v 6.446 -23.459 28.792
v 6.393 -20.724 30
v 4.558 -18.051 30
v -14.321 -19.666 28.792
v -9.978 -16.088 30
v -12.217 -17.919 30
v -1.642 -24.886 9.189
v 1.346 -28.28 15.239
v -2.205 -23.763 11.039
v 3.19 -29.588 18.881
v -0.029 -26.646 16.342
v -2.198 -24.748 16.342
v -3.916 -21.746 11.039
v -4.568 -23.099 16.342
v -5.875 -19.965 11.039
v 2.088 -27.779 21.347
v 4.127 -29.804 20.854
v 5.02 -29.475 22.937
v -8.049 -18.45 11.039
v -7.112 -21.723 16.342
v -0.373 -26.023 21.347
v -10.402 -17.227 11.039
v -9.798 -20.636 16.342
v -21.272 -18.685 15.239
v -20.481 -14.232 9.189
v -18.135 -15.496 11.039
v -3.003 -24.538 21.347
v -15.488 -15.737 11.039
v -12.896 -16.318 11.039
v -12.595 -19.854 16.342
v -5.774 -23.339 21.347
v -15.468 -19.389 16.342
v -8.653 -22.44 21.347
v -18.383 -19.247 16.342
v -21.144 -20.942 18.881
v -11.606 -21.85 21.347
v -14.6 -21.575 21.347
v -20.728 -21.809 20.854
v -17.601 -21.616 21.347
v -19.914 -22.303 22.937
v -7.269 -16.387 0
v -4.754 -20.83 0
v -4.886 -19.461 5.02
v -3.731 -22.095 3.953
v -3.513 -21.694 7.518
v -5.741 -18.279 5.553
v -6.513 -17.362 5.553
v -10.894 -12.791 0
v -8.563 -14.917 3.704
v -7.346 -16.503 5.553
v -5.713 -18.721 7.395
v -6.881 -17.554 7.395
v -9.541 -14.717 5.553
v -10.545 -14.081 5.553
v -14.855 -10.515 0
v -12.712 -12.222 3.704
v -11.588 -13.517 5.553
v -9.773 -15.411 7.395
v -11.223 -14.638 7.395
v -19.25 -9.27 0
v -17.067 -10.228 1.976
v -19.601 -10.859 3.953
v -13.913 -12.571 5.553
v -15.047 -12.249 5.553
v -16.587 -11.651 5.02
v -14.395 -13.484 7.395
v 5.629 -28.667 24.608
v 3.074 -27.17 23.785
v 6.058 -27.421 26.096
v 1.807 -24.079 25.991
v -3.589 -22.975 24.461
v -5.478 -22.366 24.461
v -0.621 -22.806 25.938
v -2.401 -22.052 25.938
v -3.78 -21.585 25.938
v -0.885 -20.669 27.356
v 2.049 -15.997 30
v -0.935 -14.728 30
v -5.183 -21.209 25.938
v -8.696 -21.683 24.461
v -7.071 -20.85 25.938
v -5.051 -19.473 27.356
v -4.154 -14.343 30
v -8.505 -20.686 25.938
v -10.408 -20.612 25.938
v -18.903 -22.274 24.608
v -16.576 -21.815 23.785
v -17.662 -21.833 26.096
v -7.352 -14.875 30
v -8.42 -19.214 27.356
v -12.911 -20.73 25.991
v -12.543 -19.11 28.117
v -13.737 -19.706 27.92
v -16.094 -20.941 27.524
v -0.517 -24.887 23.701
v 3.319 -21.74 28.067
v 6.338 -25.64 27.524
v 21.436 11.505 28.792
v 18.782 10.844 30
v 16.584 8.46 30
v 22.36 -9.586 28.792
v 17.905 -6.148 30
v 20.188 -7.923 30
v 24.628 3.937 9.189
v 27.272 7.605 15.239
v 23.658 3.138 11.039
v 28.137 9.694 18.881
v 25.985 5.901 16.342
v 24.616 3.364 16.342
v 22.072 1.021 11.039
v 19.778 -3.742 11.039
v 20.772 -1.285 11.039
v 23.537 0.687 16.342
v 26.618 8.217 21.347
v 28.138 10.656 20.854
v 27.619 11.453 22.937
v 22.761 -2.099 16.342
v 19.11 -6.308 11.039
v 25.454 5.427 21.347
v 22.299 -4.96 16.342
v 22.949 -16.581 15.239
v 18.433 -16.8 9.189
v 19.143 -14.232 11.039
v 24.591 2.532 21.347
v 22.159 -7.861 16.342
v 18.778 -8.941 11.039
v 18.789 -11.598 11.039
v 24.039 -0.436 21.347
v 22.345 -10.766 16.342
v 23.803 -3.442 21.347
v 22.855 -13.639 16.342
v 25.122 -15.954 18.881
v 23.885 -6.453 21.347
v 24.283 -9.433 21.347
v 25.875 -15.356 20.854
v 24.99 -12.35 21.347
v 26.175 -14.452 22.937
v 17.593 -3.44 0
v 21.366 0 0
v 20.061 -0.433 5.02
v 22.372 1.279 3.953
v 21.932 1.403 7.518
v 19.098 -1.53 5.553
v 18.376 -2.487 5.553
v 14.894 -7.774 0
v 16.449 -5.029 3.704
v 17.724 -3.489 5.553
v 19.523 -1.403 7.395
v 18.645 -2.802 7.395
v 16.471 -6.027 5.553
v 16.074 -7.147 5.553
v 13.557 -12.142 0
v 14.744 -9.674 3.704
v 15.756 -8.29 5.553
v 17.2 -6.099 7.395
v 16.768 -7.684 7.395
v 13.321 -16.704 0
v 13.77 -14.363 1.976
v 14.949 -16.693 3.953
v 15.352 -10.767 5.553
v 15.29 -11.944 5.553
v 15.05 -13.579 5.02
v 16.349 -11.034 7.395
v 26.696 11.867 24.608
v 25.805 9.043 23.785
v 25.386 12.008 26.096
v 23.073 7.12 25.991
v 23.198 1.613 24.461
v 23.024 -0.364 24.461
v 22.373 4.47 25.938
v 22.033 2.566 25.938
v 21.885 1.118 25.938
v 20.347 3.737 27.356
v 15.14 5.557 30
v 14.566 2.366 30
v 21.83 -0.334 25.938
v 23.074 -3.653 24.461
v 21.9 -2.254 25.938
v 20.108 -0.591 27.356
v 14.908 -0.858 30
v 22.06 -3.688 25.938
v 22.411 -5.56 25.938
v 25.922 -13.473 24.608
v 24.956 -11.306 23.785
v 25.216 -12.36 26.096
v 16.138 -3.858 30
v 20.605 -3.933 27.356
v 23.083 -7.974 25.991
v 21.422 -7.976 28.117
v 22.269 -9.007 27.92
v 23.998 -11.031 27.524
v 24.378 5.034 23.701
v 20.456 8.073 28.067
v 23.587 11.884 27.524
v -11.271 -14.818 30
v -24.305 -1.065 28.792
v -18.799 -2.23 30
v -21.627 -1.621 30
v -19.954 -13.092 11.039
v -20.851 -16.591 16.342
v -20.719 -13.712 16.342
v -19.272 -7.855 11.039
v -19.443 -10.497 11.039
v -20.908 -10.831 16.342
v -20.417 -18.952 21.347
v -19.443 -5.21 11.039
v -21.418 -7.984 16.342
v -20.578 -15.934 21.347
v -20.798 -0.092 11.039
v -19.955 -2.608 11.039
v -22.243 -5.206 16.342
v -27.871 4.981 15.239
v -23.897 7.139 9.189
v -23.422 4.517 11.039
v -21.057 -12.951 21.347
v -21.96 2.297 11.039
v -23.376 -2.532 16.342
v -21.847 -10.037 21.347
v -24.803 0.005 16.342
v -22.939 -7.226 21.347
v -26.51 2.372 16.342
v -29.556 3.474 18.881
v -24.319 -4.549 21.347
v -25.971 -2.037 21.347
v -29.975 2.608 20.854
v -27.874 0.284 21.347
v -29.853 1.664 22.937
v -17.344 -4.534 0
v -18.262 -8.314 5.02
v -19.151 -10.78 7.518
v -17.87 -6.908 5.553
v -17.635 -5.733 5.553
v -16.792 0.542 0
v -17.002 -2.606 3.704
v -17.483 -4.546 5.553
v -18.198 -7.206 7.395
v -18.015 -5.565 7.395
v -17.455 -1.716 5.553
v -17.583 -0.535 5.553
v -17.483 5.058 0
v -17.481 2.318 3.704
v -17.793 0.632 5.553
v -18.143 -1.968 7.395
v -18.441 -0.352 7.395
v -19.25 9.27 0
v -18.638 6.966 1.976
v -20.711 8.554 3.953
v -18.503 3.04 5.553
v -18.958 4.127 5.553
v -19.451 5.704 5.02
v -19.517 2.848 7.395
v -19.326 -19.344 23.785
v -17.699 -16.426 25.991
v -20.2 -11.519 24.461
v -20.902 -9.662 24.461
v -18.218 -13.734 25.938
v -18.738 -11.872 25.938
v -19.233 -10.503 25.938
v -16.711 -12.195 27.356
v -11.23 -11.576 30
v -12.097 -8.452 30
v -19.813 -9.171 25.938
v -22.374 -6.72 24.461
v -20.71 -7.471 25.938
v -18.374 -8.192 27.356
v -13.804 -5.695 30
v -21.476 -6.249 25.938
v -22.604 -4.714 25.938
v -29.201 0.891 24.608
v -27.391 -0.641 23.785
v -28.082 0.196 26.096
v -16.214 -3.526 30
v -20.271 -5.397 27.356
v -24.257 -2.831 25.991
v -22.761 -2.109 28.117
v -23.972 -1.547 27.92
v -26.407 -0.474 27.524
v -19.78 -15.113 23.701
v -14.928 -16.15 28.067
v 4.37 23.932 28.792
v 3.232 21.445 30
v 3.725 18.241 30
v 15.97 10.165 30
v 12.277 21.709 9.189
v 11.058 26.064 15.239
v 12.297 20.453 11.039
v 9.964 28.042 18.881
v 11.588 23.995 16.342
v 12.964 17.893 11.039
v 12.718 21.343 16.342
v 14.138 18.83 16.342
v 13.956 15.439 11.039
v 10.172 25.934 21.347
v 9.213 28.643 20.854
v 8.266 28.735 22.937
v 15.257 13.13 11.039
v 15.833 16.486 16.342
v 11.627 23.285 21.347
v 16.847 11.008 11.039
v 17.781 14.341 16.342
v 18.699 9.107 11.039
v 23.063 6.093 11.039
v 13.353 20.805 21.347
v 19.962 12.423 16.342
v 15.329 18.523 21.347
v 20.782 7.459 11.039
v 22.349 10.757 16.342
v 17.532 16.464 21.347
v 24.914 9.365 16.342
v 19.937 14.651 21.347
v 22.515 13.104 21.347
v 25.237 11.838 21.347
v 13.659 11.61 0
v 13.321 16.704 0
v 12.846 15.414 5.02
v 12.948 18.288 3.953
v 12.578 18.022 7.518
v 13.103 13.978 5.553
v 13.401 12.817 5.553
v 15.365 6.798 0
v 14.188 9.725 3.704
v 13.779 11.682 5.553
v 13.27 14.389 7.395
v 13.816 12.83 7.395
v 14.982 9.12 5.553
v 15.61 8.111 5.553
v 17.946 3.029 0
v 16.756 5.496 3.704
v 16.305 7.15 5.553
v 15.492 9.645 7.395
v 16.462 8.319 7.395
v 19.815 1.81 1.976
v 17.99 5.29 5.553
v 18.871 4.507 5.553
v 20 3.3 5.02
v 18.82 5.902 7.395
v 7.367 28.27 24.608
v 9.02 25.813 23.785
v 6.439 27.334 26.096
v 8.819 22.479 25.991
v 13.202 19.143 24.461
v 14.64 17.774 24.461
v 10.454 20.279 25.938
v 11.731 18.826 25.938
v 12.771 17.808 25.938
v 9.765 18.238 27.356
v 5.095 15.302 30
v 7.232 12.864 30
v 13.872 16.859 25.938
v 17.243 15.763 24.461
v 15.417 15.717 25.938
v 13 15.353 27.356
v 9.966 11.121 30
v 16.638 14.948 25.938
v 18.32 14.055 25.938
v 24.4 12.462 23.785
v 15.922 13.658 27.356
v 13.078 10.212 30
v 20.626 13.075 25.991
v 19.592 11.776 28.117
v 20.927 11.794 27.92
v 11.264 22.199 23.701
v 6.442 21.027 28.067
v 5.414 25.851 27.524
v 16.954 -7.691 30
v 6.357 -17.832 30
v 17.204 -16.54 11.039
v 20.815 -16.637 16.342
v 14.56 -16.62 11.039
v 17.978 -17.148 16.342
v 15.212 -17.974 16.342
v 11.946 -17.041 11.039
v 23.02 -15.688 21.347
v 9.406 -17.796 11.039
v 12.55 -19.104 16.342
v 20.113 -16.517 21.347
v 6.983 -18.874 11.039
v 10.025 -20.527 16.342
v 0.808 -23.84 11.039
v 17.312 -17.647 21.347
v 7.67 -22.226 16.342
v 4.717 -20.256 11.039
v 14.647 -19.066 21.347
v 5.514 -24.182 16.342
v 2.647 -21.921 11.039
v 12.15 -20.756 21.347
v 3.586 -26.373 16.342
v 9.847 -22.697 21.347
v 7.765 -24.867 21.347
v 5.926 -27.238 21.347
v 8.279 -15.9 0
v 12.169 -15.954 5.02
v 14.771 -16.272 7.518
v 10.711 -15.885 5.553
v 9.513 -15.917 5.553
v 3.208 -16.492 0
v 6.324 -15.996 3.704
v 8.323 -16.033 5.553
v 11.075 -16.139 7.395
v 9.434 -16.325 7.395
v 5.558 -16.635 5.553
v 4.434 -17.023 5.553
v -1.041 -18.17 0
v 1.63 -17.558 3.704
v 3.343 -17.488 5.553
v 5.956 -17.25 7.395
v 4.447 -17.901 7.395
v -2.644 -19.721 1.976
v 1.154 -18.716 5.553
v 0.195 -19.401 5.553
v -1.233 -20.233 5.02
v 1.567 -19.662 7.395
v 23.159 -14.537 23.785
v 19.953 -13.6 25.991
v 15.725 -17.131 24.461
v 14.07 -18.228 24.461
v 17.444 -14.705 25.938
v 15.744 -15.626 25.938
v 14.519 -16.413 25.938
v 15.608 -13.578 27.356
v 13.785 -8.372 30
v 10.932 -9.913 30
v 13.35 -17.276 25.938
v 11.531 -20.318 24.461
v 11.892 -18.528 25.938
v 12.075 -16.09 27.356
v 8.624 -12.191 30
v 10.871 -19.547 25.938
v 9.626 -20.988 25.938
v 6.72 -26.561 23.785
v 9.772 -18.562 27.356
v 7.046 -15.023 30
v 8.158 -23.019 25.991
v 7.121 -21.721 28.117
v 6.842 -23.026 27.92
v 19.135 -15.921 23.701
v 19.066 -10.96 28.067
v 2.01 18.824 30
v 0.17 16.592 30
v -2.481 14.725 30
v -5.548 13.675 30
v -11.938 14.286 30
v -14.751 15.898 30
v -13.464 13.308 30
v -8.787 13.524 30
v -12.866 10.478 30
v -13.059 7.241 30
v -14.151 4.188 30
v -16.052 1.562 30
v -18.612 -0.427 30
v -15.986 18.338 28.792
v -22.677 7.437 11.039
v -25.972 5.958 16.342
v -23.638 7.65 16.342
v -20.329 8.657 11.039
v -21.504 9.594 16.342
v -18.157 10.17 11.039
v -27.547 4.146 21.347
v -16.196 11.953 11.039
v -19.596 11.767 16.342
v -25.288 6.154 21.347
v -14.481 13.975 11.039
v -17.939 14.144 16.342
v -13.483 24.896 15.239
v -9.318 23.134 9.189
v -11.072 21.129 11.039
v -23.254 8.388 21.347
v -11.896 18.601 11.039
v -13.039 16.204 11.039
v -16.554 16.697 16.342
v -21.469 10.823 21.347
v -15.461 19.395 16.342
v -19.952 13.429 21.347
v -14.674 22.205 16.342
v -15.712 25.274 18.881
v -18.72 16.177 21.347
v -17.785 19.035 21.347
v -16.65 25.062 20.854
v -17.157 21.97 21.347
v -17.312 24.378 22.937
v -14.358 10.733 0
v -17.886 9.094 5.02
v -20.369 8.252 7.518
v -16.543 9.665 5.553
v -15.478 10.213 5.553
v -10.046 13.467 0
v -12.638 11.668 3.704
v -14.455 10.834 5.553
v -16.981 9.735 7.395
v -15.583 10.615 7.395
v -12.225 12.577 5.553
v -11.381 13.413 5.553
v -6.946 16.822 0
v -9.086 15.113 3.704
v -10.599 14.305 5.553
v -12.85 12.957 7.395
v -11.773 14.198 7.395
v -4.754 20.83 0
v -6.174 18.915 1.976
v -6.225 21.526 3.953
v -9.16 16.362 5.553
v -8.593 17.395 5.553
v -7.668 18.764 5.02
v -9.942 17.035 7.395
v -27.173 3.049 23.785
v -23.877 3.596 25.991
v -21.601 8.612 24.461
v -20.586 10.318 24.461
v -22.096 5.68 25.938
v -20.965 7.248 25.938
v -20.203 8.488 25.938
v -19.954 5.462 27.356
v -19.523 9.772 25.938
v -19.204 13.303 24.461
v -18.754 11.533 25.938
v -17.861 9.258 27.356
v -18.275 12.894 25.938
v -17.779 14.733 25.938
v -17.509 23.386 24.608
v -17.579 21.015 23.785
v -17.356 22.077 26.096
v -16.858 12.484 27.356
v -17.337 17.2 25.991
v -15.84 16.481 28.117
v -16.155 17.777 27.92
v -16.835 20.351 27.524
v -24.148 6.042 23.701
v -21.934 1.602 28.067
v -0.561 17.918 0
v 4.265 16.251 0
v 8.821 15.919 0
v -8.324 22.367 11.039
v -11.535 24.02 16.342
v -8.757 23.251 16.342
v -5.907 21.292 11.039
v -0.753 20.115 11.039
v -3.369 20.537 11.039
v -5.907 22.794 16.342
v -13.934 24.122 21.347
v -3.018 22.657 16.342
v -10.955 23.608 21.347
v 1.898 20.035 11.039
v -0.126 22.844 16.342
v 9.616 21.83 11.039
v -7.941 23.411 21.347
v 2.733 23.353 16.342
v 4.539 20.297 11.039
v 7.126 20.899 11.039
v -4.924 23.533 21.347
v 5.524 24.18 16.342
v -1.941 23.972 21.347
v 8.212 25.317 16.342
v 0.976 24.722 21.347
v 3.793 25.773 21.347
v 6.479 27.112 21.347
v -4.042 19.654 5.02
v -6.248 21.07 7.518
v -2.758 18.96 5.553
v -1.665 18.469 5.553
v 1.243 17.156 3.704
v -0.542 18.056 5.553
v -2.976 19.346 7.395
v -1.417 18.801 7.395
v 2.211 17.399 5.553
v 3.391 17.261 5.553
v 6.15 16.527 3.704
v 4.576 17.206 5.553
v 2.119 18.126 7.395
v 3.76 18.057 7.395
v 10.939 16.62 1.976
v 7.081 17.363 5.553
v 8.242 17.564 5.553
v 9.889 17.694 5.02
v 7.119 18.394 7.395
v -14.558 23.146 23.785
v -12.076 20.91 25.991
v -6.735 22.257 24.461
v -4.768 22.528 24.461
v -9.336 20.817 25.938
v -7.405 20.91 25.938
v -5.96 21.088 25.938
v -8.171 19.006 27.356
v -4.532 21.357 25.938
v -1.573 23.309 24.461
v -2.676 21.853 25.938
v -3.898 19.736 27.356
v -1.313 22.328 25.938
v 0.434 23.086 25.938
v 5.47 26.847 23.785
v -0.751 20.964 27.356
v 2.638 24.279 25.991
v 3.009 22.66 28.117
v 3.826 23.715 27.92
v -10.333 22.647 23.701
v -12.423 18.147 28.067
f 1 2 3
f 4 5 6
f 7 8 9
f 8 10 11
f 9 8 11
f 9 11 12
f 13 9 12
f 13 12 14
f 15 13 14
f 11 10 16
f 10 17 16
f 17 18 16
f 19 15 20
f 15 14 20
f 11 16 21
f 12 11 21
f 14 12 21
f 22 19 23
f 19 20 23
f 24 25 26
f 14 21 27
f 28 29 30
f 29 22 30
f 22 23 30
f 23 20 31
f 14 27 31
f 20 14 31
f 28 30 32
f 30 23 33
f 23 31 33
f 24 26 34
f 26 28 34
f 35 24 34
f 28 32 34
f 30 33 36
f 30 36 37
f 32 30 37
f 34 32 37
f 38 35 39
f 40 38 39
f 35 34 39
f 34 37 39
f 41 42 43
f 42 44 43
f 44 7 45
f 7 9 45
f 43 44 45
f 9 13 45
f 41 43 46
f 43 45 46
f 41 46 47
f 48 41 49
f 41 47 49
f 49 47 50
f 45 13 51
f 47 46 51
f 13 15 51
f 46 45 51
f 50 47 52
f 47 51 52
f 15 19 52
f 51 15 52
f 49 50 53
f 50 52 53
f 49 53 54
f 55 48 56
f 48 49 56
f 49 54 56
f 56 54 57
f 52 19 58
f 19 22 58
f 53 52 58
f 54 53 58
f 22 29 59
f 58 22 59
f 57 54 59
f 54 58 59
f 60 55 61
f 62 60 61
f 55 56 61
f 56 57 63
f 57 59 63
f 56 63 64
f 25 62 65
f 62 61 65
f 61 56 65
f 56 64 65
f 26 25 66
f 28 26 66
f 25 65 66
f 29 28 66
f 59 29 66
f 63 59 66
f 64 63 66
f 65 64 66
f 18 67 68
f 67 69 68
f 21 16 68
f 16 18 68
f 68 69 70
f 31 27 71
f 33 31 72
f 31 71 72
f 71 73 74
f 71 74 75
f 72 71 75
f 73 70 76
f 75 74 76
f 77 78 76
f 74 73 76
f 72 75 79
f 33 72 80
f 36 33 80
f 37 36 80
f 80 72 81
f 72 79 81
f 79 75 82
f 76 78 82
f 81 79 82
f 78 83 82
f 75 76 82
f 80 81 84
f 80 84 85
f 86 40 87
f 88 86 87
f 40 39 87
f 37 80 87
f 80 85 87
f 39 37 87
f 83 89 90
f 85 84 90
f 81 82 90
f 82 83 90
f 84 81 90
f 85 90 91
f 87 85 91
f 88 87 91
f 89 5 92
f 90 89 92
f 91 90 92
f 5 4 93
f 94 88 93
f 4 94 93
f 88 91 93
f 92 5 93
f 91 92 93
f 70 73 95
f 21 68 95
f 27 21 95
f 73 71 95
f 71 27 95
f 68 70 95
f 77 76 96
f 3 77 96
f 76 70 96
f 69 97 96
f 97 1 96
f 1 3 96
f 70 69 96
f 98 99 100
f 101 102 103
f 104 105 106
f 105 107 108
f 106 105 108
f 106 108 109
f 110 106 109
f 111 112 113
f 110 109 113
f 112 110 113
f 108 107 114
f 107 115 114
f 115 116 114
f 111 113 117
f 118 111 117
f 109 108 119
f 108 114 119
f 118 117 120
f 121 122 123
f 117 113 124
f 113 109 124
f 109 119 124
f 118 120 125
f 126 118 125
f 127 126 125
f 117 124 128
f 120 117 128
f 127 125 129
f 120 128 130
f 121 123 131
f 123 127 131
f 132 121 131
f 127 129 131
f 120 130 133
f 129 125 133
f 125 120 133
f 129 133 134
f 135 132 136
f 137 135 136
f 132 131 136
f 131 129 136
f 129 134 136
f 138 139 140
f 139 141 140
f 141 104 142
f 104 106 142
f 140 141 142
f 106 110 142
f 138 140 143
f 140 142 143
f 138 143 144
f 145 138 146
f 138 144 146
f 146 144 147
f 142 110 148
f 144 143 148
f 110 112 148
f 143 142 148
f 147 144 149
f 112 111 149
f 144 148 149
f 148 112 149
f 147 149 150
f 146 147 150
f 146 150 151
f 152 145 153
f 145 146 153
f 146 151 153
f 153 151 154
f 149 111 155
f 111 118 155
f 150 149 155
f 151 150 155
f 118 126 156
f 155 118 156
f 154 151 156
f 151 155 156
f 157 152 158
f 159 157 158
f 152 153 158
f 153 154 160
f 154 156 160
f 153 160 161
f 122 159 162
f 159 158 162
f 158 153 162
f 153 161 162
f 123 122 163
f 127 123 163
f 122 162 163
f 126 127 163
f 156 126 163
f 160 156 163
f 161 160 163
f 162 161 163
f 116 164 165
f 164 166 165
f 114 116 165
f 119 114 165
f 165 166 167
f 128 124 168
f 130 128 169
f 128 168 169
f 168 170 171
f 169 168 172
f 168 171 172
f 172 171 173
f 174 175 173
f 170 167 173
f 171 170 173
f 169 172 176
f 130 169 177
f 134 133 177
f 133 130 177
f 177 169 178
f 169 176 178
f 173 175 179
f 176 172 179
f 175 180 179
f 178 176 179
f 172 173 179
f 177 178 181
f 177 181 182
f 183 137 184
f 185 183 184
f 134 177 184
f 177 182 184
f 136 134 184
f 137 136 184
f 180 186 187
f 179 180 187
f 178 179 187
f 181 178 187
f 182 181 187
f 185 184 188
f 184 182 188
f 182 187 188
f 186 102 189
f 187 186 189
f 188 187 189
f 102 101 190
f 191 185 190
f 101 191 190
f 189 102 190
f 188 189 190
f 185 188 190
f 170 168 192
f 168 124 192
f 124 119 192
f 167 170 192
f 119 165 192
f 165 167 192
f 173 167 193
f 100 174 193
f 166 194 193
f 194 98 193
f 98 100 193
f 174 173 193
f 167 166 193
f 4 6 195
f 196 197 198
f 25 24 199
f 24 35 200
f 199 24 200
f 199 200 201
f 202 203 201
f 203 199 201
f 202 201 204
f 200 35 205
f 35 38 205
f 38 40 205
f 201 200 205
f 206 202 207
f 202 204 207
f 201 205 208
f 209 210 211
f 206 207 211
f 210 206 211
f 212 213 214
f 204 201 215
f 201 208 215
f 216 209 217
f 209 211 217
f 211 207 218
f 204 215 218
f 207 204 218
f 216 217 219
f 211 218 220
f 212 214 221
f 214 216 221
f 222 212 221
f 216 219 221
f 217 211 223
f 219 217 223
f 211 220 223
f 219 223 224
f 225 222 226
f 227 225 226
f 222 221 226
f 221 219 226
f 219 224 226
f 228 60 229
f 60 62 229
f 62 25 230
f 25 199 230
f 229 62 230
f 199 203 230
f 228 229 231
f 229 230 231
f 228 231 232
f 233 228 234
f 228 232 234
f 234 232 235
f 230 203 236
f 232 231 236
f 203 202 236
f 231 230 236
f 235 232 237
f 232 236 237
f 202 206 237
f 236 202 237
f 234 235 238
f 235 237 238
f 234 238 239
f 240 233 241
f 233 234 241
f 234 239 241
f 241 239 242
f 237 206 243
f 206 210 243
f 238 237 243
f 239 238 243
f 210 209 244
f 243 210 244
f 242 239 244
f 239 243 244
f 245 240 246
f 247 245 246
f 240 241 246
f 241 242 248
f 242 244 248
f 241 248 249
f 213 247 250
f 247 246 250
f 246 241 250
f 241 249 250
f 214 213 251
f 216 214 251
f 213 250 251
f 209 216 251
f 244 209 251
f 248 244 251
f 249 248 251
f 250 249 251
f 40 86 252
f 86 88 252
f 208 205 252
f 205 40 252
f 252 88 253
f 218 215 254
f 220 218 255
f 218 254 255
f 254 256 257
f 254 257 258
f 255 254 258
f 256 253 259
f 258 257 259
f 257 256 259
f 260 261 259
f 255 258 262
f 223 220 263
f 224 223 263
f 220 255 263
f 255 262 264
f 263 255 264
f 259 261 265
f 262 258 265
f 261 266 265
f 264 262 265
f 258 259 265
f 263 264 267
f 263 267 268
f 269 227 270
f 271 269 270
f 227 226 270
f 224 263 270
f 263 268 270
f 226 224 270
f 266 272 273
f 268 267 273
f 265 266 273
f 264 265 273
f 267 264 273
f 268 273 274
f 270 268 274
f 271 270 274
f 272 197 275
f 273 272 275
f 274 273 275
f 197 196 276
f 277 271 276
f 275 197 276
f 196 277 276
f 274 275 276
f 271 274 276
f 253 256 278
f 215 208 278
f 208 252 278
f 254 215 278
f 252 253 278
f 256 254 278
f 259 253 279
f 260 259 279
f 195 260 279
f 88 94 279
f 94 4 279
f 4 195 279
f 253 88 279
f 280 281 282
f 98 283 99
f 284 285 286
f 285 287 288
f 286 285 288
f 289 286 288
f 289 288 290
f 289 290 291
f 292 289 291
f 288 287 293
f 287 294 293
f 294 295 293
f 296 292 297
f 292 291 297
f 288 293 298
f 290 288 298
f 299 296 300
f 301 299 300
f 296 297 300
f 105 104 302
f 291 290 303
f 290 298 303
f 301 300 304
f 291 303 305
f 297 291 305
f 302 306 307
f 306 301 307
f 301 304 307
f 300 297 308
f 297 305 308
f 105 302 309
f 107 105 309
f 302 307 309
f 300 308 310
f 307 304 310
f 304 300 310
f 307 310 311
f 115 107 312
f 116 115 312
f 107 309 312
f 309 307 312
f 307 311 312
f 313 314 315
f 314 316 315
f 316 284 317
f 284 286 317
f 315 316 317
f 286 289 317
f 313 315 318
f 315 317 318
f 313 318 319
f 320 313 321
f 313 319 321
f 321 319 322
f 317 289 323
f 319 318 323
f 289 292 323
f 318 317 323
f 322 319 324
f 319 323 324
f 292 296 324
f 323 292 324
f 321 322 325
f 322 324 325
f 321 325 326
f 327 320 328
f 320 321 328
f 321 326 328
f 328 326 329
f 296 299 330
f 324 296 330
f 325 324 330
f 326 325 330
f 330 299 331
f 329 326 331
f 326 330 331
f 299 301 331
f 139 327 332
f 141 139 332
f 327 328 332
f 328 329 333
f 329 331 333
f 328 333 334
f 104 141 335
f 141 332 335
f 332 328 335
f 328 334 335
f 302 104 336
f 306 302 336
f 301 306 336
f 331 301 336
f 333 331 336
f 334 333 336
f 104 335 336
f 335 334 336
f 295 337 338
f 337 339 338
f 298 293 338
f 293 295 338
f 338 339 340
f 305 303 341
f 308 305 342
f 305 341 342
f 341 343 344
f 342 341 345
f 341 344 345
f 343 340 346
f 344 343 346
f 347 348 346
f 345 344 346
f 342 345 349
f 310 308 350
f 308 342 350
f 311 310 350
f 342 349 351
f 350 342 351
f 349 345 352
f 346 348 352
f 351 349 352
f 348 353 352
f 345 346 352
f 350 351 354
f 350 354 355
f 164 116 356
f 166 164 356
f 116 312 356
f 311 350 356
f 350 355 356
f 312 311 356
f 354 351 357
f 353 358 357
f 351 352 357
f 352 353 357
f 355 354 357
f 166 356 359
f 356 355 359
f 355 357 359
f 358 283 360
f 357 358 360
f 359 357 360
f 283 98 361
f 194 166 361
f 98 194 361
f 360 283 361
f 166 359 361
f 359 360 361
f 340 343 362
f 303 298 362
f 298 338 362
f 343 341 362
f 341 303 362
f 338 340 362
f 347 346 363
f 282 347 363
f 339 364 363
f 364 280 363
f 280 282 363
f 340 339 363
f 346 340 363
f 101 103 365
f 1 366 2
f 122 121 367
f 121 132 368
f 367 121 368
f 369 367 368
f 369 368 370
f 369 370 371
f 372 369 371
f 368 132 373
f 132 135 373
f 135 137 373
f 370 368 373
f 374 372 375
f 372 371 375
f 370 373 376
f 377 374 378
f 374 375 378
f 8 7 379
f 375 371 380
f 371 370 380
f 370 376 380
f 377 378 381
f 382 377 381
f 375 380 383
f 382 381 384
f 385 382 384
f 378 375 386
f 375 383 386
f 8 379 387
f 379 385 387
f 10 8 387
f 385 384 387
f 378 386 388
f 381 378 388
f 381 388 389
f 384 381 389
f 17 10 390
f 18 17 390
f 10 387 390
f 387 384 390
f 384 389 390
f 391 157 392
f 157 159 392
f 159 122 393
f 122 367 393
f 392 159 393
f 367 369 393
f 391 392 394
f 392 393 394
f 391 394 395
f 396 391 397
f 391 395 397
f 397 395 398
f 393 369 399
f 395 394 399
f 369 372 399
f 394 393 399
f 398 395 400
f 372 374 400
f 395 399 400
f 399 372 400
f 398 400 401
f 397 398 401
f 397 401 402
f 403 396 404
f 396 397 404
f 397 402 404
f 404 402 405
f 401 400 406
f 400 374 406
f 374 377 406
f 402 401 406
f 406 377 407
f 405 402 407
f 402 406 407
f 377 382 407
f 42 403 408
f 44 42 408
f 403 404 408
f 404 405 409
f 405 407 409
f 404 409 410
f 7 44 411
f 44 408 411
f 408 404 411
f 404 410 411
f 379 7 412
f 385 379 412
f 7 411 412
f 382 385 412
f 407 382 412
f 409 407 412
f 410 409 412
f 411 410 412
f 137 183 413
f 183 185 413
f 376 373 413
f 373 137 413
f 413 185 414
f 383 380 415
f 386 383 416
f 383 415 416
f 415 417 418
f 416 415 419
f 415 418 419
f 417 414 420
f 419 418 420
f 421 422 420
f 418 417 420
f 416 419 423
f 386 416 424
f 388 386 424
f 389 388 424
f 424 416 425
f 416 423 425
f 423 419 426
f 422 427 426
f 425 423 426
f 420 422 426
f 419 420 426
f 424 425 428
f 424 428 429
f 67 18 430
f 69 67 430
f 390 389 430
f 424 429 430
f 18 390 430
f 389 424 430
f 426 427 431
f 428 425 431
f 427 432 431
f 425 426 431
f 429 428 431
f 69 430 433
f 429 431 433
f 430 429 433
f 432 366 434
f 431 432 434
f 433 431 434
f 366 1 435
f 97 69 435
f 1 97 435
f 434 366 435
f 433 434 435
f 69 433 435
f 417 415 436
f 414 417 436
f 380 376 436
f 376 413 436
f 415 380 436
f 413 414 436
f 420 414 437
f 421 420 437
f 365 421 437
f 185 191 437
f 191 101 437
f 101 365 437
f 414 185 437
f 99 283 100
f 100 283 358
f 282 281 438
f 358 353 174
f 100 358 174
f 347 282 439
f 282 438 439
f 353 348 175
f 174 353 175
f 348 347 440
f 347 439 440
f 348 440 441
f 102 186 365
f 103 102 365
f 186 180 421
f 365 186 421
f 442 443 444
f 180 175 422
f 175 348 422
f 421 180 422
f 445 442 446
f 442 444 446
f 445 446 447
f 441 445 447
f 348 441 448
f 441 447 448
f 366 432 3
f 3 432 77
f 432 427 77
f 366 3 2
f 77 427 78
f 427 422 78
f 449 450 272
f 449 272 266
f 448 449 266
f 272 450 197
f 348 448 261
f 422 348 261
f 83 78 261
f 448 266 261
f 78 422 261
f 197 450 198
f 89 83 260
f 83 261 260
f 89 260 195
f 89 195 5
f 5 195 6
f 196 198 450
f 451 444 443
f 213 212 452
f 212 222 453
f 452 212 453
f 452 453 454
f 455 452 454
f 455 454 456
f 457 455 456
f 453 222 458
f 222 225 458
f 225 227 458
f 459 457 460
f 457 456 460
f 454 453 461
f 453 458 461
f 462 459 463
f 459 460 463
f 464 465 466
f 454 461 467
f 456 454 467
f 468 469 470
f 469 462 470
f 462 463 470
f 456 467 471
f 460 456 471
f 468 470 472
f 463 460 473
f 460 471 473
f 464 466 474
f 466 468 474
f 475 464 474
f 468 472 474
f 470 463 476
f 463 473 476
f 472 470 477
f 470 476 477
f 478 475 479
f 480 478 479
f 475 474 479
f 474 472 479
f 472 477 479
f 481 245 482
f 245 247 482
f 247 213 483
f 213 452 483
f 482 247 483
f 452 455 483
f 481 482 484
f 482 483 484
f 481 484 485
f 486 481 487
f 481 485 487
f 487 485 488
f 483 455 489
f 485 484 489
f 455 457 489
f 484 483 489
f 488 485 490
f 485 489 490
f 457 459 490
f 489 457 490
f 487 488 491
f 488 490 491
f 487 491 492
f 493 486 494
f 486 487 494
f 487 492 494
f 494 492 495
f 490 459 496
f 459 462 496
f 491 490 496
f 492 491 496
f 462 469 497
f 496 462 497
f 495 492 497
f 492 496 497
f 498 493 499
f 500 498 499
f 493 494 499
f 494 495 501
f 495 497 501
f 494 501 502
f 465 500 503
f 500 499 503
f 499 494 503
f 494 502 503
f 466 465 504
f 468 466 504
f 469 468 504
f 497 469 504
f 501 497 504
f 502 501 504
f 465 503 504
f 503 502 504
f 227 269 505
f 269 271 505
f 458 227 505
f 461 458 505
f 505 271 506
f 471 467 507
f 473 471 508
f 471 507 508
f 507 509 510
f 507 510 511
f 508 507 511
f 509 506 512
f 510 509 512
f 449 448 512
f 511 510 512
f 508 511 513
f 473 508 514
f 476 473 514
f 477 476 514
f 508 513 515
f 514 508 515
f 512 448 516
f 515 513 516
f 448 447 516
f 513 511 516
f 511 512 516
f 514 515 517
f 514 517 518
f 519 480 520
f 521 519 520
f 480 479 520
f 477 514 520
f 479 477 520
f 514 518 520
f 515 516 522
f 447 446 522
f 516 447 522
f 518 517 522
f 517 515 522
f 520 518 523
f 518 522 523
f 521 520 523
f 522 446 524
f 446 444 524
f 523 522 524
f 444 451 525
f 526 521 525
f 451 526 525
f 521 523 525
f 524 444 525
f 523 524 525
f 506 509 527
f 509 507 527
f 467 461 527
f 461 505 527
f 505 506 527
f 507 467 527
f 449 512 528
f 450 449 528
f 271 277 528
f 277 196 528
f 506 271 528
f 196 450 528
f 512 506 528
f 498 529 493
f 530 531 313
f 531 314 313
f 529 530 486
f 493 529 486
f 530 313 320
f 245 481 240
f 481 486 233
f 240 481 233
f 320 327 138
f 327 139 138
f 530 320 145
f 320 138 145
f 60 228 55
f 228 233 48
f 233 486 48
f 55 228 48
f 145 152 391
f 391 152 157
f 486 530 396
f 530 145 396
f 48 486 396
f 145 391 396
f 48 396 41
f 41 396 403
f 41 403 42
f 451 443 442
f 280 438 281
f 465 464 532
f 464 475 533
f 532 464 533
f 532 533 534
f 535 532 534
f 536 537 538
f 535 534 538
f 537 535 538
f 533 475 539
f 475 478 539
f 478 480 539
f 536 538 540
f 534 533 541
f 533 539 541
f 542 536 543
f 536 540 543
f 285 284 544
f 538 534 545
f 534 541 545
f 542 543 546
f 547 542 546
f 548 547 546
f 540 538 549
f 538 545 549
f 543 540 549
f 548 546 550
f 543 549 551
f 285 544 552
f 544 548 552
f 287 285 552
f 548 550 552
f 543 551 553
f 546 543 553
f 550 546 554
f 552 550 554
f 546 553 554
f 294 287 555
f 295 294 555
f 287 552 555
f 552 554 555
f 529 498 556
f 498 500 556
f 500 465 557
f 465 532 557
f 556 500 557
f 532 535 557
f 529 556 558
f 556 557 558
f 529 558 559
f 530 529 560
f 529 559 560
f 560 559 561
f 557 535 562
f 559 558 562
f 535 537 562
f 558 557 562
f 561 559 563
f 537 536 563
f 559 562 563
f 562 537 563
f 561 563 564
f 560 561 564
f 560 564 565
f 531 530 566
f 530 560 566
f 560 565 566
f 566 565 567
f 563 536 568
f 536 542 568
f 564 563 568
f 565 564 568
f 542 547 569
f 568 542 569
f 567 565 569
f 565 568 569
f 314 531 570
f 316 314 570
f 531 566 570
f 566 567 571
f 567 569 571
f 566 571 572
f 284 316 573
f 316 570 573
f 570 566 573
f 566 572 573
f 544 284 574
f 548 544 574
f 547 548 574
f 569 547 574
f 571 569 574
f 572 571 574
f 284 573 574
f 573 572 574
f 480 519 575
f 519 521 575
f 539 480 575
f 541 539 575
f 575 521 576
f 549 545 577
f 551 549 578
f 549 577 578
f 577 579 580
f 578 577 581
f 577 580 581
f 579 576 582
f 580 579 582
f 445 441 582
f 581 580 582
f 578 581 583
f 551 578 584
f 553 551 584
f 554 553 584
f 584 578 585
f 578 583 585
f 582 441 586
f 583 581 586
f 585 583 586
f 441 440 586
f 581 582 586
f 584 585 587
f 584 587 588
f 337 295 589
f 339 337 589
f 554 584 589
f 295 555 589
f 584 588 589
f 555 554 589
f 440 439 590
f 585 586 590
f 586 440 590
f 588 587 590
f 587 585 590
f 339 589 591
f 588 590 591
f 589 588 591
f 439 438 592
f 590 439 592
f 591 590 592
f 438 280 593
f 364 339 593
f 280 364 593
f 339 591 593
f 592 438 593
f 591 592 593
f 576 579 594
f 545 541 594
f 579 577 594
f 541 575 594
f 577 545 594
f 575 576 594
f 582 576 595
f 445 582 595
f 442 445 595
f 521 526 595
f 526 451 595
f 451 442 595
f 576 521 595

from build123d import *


with BuildPart() as part:
    # Sketch (on XY_Plane of Origin) → AdditiveLoft section 0
    with BuildSketch(Plane.XY):
        with BuildLine():
            ThreePointArc((13.321386, 16.70449), (15.122391, 7.28256), (21.365845, 0))
            ThreePointArc((21.365845, 0), (15.122391, -7.28256), (13.321386, -16.70449))
            ThreePointArc((13.321386, -16.70449), (3.734922, -16.363763), (-4.754348, -20.830158))
            ThreePointArc((-4.754348, -20.830158), (-10.465019, -13.122719), (-19.249961, -9.270293))
            ThreePointArc((-19.249961, -9.270293), (-16.784588, 0), (-19.249961, 9.270293))
            ThreePointArc((-19.249961, 9.270293), (-10.465019, 13.122719), (-4.754348, 20.830158))
            ThreePointArc((-4.754348, 20.830158), (3.734922, 16.363763), (13.321386, 16.70449))
        make_face()
    # Sketch001 (on Sketch) → AdditiveLoft section 1
    with BuildSketch(Plane.XY.offset(10)):
        with BuildLine():
            ThreePointArc((12.146837, 22.305334), (15.826911, 11.378774), (25.012441, 4.410368))
            ThreePointArc((25.012441, 4.410368), (18.764202, -5.279428), (19.043167, -16.805695))
            ThreePointArc((19.043167, -16.805695), (7.571666, -17.962113), (-1.266001, -25.366727))
            ThreePointArc((-1.266001, -25.366727), (-9.322489, -17.118961), (-20.621844, -14.826096))
            ThreePointArc((-20.621844, -14.826096), (-19.19662, -3.384882), (-24.449018, 6.878887))
            ThreePointArc((-24.449018, 6.878887), (-14.615304, 12.898082), (-9.865583, 23.403928))
            ThreePointArc((-9.865583, 23.403928), (0.971634, 19.468527), (12.146837, 22.305334))
        make_face()
    # Sketch002 → AdditiveLoft section 2
    with BuildSketch(Plane.XY.offset(20)):
        with BuildLine():
            ThreePointArc((9.553759, 28.435319), (16.677604, 17.098702), (28.188299, 10.259702))
            ThreePointArc((28.188299, 10.259702), (23.766619, -2.378209), (25.596475, -15.64168))
            ThreePointArc((25.596475, -15.64168), (12.958886, -20.06428), (3.729983, -29.764558))
            ThreePointArc((3.729983, -29.764558), (-7.607153, -22.641539), (-20.945262, -21.474117))
            ThreePointArc((-20.945262, -21.474117), (-22.44485, -8.169257), (-29.848298, 2.986773))
            ThreePointArc((-29.848298, 2.986773), (-20.381118, 12.454642), (-16.274956, 25.198561))
            ThreePointArc((-16.274956, 25.198561), (-2.969988, 23.699942), (9.553759, 28.435319))
        make_face()
    # Sketch003 (on XY_Plane of Origin) → AdditiveLoft section 3
    with BuildSketch(Plane.XY.offset(30)):
        with BuildLine():
            ThreePointArc((3.232355, 21.445277), (8.242463, 12.089473), (18.781933, 10.843754))
            ThreePointArc((18.781933, 10.843754), (14.591023, 1.093446), (20.188332, -7.923336))
            ThreePointArc((20.188332, -7.923336), (9.952244, -10.725968), (6.392505, -20.723993))
            ThreePointArc((6.392505, -20.723993), (-2.180777, -14.46851), (-12.217008, -17.91906))
            ThreePointArc((-12.217008, -17.91906), (-12.671629, -7.315968), (-21.626865, -1.62071))
            ThreePointArc((-21.626865, -1.62071), (-13.620486, 5.345647), (-14.751252, 15.898068))
            ThreePointArc((-14.751252, 15.898068), (-4.312839, 13.981881), (3.232355, 21.445277))
        make_face()
    loft()


solid = part.part
